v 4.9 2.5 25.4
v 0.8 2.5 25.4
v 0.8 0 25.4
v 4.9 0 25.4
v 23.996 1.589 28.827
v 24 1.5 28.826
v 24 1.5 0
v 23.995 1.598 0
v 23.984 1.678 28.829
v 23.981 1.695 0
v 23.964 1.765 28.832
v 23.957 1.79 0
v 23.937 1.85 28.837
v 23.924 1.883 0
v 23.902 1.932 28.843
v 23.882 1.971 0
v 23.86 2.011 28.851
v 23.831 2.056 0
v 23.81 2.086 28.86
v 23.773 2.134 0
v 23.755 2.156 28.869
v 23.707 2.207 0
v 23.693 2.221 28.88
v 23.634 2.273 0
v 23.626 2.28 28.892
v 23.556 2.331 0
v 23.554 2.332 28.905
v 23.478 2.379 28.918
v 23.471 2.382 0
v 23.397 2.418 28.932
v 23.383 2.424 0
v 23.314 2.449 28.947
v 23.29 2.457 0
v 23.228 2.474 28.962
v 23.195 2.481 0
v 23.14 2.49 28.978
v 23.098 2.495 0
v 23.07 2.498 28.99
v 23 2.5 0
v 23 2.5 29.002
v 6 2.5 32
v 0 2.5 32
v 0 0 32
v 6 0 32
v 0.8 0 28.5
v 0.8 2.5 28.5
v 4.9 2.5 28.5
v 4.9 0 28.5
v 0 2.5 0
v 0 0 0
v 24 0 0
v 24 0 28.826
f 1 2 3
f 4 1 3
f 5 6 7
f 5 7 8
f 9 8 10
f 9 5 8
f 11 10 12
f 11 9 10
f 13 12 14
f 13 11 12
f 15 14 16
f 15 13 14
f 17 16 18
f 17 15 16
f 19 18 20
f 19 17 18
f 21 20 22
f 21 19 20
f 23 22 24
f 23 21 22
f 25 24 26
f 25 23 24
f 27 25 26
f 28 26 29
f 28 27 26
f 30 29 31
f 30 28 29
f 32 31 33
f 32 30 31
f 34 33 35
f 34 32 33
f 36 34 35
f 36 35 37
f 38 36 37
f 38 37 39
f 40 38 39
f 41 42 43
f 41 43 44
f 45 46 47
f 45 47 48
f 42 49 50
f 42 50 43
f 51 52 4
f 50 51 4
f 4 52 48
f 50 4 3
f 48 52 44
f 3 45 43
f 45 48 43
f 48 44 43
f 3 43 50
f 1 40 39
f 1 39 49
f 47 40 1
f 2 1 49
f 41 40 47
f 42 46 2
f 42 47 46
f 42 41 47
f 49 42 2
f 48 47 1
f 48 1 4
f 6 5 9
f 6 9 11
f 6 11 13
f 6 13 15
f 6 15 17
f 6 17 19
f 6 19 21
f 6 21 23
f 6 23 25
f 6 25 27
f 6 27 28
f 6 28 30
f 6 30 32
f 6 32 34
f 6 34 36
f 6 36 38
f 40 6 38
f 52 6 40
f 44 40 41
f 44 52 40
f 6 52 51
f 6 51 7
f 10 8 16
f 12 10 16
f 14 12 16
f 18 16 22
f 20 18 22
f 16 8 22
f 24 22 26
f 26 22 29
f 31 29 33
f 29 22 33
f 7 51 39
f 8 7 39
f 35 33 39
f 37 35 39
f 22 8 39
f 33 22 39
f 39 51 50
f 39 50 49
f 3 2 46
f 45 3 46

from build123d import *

# Parameters (mm, degrees)
SKETCH_3_W          = 2.5
SKETCH_3_H          = 24
EXTRUDE_1_DEPTH     = 33
FILLET_1_R          = 1
CUT_EXTRUDE_1_DEPTH = 41.880924647
SKETCH_5_W          = 2.5
SKETCH_5_H          = 3.1
CUT_EXTRUDE_2_DEPTH = 4.9
SKETCH_6_W          = 24
SKETCH_6_H          = 2.5
CUT_EXTRUDE_3_DEPTH = 1
CUT_EXTRUDE_4_DEPTH = 41.078048855
SKETCH_8_W          = 0.8
SKETCH_8_H          = 3.1
EXTRUDE_2_DEPTH     = 2.5


with BuildPart() as part:
    # 草图3 → 凸台-拉伸1 (new body)
    with BuildSketch(Plane(origin=(0, 0, 0), x_dir=(0, 1, 0), z_dir=(0, 0, 1))):
        with Locations((1.25, -12)):
            Rectangle(SKETCH_3_W, SKETCH_3_H)
    extrude(amount=EXTRUDE_1_DEPTH)

    # 圆角1
    fillet_1_edges = [part.edges().sort_by_distance(p)[0] for p in [
        (24, 2.5, 16.5),
    ]]
    fillet(fillet_1_edges, radius=FILLET_1_R)

    # 草图4 → 切除-拉伸1 (cut, through all)
    with BuildSketch(Plane.XZ):
        Polygon((3, 33), (24, 31.162738066), (24, 33), align=None)
    extrude(amount=-CUT_EXTRUDE_1_DEPTH, mode=Mode.SUBTRACT)

    # 草图5 → 切除-拉伸2 (cut)
    with BuildSketch(Plane(origin=(0, 0, 0), x_dir=(0, -1, 0), z_dir=(-1, 0, 0))):
        with Locations((-1.25, 26.95)):
            Rectangle(SKETCH_5_W, SKETCH_5_H)
    extrude(amount=-CUT_EXTRUDE_2_DEPTH, mode=Mode.SUBTRACT)

    # 草图6 → 切除-拉伸3 (cut)
    with BuildSketch(Plane.XY.offset(33)):
        with Locations((12, 1.25)):
            Rectangle(SKETCH_6_W, SKETCH_6_H)
    extrude(amount=-CUT_EXTRUDE_3_DEPTH, mode=Mode.SUBTRACT)

    # 草图7 → 切除-拉伸4 (cut, through all)
    with BuildSketch(Plane.XZ):
        Polygon((24, 31.162738066), (24, 28.826114347), (6, 32), (14.430052303, 32), align=None)
    extrude(amount=-CUT_EXTRUDE_4_DEPTH, mode=Mode.SUBTRACT)

    # 草图8 → 凸台-拉伸2 (add)
    with BuildSketch(Plane(origin=(0, 2.5, 0), x_dir=(-1, 0, 0), z_dir=(0, 1, 0))):
        with Locations((-0.4, 26.95)):
            Rectangle(SKETCH_8_W, SKETCH_8_H)
    extrude(amount=-EXTRUDE_2_DEPTH)


solid = part.part
